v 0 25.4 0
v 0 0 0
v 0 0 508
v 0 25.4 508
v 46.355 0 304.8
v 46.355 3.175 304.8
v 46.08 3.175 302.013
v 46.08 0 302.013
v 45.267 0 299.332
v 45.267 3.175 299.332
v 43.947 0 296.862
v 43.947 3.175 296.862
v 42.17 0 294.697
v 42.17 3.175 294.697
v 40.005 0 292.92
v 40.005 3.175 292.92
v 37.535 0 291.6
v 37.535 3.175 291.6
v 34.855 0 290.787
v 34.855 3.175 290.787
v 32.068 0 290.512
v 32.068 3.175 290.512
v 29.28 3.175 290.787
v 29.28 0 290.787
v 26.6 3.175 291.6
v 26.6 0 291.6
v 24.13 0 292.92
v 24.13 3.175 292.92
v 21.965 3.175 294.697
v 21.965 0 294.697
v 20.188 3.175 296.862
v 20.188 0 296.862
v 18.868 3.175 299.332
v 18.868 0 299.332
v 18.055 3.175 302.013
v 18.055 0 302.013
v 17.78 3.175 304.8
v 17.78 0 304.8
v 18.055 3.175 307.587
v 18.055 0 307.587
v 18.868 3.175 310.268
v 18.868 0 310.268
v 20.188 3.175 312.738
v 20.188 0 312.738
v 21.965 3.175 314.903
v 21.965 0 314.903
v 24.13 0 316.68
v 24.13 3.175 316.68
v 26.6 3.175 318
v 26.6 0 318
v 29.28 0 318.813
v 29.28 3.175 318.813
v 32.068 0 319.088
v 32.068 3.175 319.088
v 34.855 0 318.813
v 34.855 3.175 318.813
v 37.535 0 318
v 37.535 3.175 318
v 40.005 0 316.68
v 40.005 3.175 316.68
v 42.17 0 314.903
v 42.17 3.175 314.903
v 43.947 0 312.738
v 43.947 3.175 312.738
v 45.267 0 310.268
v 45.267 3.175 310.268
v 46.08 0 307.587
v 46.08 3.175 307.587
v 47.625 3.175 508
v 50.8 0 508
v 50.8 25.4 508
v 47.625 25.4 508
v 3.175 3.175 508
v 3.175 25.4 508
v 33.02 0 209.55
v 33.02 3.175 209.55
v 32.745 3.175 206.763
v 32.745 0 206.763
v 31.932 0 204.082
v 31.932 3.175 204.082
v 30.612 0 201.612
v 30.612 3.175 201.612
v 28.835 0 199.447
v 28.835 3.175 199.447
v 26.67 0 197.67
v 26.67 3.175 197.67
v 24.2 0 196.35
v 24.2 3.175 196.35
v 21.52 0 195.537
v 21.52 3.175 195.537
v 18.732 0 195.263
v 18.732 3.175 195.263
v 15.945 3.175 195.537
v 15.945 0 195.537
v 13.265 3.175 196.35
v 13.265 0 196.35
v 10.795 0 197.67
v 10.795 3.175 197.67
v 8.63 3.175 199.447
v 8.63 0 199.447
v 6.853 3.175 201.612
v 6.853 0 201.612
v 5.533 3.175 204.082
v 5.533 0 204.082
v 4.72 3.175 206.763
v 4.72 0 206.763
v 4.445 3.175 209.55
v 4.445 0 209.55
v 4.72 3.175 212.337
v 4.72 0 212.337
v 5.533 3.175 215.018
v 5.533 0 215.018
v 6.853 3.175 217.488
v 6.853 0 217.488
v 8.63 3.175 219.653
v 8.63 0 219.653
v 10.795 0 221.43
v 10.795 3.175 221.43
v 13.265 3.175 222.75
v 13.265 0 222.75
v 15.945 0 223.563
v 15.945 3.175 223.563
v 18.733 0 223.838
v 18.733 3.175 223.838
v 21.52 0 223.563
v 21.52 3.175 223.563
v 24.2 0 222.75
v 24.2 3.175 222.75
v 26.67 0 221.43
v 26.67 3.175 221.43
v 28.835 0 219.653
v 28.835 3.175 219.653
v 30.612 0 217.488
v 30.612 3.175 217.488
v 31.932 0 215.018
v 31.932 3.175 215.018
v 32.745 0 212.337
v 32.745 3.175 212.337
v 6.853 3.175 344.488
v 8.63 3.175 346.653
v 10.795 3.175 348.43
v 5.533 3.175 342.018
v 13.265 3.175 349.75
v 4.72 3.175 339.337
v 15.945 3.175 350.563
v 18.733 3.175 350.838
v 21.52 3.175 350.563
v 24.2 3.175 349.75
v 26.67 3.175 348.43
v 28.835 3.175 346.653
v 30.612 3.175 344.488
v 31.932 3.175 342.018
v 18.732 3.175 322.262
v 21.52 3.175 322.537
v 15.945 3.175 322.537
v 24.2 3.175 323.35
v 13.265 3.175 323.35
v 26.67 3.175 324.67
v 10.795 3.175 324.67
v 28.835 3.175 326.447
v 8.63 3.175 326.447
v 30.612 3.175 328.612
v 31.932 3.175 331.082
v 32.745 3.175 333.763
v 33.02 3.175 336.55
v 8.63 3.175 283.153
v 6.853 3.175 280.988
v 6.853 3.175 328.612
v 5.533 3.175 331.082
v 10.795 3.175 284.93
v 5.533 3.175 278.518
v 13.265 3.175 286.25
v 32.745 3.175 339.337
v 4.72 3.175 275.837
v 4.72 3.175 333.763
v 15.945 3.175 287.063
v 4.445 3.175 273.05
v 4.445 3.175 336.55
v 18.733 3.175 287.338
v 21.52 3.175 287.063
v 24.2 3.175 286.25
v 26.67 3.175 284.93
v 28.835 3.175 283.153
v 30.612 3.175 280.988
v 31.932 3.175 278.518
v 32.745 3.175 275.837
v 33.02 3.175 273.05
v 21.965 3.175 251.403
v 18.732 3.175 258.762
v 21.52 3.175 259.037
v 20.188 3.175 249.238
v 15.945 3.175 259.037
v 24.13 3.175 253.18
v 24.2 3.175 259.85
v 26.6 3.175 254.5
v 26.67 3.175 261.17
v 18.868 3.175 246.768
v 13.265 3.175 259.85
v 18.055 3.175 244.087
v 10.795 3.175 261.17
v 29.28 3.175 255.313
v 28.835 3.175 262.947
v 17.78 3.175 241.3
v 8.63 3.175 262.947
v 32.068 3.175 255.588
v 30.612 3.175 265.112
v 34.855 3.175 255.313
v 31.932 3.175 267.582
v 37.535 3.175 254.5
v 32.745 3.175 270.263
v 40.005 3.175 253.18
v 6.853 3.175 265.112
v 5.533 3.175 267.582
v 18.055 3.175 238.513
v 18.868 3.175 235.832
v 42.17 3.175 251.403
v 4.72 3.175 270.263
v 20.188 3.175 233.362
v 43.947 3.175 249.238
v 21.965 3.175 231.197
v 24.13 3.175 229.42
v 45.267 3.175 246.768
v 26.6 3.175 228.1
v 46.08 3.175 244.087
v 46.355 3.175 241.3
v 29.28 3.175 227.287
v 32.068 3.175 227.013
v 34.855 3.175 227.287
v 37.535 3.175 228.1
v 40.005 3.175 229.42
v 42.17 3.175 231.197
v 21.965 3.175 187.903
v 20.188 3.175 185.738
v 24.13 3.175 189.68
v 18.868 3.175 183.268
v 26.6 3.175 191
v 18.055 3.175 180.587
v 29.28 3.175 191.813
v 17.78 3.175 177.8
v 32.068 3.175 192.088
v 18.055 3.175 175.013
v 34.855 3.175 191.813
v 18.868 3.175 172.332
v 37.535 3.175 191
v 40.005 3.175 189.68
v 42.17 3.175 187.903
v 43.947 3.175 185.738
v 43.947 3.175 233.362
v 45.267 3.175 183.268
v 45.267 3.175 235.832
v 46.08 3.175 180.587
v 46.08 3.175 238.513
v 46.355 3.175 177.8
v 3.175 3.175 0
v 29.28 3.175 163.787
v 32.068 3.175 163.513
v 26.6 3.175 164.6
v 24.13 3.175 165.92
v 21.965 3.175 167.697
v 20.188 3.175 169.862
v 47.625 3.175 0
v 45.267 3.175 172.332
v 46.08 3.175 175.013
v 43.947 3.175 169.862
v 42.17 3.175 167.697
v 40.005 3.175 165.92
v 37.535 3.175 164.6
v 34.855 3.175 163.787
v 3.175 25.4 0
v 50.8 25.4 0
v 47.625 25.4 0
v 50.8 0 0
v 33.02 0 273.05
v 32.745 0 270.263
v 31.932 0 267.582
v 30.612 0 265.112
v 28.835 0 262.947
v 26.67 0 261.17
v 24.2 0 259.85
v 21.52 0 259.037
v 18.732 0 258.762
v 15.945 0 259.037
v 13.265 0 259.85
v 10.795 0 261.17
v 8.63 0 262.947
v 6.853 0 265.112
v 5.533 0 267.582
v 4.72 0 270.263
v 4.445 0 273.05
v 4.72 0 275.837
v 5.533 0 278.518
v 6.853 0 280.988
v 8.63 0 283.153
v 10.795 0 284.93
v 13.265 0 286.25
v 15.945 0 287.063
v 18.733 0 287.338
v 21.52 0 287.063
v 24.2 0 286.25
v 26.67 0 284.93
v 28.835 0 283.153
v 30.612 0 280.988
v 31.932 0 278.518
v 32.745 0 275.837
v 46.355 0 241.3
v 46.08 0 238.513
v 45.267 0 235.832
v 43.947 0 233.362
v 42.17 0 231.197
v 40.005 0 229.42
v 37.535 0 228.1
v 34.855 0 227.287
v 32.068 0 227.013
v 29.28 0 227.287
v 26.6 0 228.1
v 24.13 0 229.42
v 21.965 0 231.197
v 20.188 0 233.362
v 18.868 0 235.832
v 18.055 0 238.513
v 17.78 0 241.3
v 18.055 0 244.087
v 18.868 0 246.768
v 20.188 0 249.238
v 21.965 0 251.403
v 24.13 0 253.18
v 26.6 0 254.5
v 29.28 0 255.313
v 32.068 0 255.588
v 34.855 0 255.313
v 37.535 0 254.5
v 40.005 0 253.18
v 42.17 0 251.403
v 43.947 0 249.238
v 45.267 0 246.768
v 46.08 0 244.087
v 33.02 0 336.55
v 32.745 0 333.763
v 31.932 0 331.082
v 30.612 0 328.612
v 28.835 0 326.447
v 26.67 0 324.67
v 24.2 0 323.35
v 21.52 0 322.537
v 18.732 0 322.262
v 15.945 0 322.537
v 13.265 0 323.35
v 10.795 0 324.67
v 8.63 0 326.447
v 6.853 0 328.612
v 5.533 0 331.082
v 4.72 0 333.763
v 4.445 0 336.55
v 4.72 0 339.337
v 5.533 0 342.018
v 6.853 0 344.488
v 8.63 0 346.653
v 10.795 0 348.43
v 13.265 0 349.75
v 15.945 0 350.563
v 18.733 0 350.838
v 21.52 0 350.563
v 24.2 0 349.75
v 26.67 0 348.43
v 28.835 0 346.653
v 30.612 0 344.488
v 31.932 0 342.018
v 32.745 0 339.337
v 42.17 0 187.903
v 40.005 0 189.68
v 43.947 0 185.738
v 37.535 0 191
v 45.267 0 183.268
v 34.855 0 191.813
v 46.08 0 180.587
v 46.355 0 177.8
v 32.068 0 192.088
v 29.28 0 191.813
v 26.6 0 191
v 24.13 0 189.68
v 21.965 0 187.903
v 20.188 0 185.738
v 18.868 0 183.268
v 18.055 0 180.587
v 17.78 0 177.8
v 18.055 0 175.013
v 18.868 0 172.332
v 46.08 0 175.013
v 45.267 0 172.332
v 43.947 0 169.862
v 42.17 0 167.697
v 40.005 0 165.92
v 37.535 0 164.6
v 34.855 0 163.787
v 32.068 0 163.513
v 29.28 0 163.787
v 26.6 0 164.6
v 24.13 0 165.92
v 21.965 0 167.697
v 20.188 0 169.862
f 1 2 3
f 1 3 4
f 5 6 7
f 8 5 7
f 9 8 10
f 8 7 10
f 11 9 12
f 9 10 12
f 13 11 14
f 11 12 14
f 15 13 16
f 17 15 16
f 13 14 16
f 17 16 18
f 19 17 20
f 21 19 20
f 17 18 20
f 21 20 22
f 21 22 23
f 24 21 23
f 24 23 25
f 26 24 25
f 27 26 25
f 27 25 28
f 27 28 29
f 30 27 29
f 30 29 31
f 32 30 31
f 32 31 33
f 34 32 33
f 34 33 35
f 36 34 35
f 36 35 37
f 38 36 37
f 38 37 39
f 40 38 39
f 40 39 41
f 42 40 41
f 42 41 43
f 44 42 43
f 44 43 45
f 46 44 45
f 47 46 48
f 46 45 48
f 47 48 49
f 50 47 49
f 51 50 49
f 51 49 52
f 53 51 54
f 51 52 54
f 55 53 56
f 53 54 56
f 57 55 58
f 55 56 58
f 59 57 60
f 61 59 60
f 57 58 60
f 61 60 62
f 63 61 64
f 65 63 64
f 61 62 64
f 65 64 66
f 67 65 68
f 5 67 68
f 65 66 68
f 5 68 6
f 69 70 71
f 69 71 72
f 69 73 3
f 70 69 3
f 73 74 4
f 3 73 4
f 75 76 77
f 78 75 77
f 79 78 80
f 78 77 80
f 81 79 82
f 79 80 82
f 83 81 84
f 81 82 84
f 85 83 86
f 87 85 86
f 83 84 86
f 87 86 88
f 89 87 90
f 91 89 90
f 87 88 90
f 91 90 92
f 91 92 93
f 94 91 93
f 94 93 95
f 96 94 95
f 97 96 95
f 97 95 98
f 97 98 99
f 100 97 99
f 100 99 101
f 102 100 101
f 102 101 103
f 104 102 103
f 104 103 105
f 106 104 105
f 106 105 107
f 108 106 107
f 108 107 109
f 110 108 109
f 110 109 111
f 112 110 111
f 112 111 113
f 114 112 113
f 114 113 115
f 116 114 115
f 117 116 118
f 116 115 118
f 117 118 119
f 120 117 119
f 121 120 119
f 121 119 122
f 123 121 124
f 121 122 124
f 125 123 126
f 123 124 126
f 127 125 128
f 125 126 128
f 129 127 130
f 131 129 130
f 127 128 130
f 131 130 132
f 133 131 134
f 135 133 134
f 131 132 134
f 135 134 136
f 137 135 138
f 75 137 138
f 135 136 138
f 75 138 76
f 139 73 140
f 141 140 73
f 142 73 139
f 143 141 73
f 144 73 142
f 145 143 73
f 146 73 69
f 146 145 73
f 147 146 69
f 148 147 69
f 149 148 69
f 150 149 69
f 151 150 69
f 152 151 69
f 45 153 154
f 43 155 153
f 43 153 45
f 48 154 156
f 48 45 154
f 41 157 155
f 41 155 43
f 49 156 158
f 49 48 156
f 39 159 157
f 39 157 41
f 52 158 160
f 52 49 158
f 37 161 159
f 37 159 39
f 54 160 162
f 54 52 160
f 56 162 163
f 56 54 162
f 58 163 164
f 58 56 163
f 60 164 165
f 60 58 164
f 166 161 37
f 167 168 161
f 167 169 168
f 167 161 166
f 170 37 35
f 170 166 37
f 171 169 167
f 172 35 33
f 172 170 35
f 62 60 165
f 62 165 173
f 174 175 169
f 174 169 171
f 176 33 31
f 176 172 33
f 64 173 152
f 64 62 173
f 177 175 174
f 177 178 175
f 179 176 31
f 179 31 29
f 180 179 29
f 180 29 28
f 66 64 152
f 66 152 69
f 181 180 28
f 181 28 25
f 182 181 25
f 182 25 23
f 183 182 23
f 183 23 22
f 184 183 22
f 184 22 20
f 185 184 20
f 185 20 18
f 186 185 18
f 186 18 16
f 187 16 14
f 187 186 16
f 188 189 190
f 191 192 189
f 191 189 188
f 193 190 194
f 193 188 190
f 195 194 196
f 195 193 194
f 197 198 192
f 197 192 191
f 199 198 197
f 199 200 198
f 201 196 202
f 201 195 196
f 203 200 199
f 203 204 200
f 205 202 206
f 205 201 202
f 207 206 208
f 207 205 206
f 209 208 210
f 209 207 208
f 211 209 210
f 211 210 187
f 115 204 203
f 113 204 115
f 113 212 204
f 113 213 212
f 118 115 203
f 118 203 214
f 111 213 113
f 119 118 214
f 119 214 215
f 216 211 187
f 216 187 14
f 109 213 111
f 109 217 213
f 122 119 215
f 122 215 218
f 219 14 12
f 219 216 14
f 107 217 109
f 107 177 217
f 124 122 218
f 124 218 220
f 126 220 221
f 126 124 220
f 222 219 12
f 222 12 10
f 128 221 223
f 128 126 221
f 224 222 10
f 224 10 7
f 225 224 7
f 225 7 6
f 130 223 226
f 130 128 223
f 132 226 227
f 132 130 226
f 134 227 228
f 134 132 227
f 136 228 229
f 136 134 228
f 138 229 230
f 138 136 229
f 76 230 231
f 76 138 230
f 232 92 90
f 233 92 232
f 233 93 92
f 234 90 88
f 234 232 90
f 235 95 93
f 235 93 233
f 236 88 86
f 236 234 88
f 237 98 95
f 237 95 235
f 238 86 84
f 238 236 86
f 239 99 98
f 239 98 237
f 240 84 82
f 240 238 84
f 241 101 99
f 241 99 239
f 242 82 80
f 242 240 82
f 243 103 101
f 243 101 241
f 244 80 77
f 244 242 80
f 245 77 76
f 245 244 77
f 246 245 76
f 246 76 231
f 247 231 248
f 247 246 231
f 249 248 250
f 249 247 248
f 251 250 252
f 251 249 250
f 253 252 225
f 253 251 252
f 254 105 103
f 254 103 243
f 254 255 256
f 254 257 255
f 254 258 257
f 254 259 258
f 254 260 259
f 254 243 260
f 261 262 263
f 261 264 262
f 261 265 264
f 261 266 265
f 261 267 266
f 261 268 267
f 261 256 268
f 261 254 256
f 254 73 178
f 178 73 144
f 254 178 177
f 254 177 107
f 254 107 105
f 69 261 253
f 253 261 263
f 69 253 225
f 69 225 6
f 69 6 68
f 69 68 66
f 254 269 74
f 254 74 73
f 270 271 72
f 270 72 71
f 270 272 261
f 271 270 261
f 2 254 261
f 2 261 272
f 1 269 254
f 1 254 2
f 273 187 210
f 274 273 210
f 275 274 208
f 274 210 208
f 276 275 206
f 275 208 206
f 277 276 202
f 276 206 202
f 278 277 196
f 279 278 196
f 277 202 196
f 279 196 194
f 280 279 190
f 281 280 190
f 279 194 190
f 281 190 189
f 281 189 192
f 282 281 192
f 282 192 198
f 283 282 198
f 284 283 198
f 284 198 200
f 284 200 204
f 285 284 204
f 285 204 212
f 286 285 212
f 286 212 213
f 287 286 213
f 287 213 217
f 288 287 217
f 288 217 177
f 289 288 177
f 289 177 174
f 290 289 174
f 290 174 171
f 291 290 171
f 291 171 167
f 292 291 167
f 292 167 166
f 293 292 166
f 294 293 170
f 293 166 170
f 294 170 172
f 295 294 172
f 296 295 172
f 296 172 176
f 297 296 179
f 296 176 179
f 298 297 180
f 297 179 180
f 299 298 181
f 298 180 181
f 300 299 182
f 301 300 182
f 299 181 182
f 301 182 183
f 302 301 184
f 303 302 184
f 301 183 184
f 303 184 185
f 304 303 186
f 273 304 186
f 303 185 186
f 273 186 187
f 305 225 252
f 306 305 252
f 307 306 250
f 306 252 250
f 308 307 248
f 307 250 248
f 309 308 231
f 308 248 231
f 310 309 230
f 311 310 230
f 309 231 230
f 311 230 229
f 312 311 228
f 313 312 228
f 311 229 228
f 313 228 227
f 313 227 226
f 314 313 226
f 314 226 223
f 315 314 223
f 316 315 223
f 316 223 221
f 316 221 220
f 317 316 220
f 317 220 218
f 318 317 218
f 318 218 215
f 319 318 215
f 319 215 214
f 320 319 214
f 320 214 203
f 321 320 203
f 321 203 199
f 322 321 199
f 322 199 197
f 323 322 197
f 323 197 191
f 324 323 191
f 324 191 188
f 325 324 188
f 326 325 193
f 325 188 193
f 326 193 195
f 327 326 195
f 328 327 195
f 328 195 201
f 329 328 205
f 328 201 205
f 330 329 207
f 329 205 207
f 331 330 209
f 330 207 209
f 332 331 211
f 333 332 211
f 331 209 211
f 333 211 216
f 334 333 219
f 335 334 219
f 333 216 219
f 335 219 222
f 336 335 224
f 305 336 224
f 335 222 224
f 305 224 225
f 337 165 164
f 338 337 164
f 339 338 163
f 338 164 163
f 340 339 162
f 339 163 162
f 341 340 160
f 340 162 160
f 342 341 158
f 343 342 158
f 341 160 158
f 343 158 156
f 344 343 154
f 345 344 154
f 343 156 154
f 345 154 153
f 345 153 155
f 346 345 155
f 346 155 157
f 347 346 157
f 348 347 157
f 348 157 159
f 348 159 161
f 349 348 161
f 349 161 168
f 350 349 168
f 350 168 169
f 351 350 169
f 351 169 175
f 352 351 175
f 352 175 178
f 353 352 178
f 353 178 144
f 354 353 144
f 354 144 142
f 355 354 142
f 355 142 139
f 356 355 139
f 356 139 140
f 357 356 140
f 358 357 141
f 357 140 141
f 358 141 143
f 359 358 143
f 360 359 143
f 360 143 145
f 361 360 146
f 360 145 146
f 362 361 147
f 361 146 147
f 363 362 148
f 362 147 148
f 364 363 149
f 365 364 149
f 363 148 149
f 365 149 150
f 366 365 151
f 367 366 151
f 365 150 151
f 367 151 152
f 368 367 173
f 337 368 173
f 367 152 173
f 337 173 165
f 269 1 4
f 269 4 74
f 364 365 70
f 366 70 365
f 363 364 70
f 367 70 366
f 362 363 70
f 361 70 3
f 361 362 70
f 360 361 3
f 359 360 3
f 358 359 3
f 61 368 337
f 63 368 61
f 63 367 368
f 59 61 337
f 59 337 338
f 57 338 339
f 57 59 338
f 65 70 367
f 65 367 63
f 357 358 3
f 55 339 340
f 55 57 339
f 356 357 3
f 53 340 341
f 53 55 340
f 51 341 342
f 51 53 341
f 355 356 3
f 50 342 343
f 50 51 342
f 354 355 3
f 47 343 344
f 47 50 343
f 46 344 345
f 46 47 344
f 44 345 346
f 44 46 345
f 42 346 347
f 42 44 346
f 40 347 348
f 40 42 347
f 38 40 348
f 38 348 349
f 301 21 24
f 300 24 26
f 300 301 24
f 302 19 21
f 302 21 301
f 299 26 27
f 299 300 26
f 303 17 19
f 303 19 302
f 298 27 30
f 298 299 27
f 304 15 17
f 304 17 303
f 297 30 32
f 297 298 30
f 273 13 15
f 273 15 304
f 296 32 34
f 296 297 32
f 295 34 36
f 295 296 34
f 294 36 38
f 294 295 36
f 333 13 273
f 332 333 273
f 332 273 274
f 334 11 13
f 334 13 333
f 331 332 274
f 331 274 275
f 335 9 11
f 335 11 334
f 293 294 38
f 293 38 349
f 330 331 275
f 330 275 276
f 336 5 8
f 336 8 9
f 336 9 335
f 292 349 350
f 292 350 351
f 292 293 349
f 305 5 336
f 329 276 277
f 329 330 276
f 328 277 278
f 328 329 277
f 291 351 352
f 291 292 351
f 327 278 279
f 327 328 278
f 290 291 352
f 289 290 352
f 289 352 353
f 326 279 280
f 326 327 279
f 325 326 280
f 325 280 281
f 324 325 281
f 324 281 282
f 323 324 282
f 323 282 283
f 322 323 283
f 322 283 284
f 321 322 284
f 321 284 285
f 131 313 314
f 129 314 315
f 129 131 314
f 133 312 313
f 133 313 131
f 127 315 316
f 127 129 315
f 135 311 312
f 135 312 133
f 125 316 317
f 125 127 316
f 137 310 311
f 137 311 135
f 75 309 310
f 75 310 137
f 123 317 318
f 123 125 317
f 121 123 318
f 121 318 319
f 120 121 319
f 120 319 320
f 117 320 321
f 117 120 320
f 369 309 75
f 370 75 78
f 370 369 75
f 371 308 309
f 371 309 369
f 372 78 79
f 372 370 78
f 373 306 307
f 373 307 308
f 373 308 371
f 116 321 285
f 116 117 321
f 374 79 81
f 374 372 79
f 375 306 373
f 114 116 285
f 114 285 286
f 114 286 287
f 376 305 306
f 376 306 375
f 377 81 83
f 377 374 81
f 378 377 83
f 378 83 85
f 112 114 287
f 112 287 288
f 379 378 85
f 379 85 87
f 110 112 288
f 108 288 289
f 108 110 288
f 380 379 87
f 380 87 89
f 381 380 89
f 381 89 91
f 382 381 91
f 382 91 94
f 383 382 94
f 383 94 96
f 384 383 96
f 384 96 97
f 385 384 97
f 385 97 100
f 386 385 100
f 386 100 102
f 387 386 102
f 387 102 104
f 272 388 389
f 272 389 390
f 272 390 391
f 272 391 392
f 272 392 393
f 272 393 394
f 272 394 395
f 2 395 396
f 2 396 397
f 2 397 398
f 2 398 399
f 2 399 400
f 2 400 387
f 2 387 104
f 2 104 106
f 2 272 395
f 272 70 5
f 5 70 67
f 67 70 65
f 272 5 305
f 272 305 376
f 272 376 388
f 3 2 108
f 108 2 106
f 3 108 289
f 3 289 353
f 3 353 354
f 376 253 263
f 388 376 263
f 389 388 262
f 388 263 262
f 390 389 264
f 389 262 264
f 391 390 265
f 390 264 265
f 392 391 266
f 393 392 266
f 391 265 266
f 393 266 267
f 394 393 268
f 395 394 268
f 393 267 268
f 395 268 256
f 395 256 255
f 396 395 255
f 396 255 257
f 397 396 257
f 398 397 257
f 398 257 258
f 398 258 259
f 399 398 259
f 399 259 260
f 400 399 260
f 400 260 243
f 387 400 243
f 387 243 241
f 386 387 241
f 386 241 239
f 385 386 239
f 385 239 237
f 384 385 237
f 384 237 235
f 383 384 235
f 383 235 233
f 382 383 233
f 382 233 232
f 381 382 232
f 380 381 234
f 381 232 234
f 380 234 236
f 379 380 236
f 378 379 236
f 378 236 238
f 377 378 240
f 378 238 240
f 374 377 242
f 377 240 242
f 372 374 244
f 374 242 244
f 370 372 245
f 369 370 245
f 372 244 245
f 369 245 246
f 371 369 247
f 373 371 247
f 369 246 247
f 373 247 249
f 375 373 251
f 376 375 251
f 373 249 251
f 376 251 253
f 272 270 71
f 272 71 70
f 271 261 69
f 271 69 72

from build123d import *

# Parameters (mm, degrees)
BOSS_EXTRUDE1_DEPTH = 508
CUT_EXTRUDE1_REACH  = 5.175
SKETCH2_R           = 14.2875


with BuildPart() as part:
    # Sketch1 → Boss-Extrude1 (new body)
    with BuildSketch(Plane.XY):
        Polygon((47.625, 3.175), (47.625, 25.4), (50.8, 25.4), (50.8, 0), (0, 0), (0, 25.4), (3.175, 25.4), (3.175, 3.175), align=None)
    extrude(amount=BOSS_EXTRUDE1_DEPTH)

    # Sketch2 → Cut-Extrude1 (cut, up to next)
    with BuildSketch(Plane(origin=(0, 3.175, 0), x_dir=(1, 0, 0), z_dir=(0, 1, 0)), mode=Mode.PRIVATE) as cut_extrude1_sk1:
        with Locations((18.7325, -336.55)):
            Circle(SKETCH2_R)
    cut_extrude1_tool1 = extrude(cut_extrude1_sk1.sketch, amount=-CUT_EXTRUDE1_REACH, mode=Mode.PRIVATE) & part.part
    add(cut_extrude1_tool1.solids().sort_by_distance((18.7325, 3.175, 336.55))[0], mode=Mode.SUBTRACT)
    # Sketch2 → Cut-Extrude1 (cut, up to next)
    with BuildSketch(Plane(origin=(0, 3.175, 0), x_dir=(1, 0, 0), z_dir=(0, 1, 0)), mode=Mode.PRIVATE) as cut_extrude1_sk2:
        with Locations((32.0675, -304.8)):
            Circle(SKETCH2_R)
    cut_extrude1_tool2 = extrude(cut_extrude1_sk2.sketch, amount=-CUT_EXTRUDE1_REACH, mode=Mode.PRIVATE) & part.part
    add(cut_extrude1_tool2.solids().sort_by_distance((32.0675, 3.175, 304.8))[0], mode=Mode.SUBTRACT)
    # Sketch2 → Cut-Extrude1 (cut, up to next)
    with BuildSketch(Plane(origin=(0, 3.175, 0), x_dir=(1, 0, 0), z_dir=(0, 1, 0)), mode=Mode.PRIVATE) as cut_extrude1_sk3:
        with Locations((18.7325, -273.05)):
            Circle(SKETCH2_R)
    cut_extrude1_tool3 = extrude(cut_extrude1_sk3.sketch, amount=-CUT_EXTRUDE1_REACH, mode=Mode.PRIVATE) & part.part
    add(cut_extrude1_tool3.solids().sort_by_distance((18.7325, 3.175, 273.05))[0], mode=Mode.SUBTRACT)
    # Sketch2 → Cut-Extrude1 (cut, up to next)
    with BuildSketch(Plane(origin=(0, 3.175, 0), x_dir=(1, 0, 0), z_dir=(0, 1, 0)), mode=Mode.PRIVATE) as cut_extrude1_sk4:
        with Locations((32.0675, -241.3)):
            Circle(SKETCH2_R)
    cut_extrude1_tool4 = extrude(cut_extrude1_sk4.sketch, amount=-CUT_EXTRUDE1_REACH, mode=Mode.PRIVATE) & part.part
    add(cut_extrude1_tool4.solids().sort_by_distance((32.0675, 3.175, 241.3))[0], mode=Mode.SUBTRACT)
    # Sketch2 → Cut-Extrude1 (cut, up to next)
    with BuildSketch(Plane(origin=(0, 3.175, 0), x_dir=(1, 0, 0), z_dir=(0, 1, 0)), mode=Mode.PRIVATE) as cut_extrude1_sk5:
        with Locations((18.7325, -209.55)):
            Circle(SKETCH2_R)
    cut_extrude1_tool5 = extrude(cut_extrude1_sk5.sketch, amount=-CUT_EXTRUDE1_REACH, mode=Mode.PRIVATE) & part.part
    add(cut_extrude1_tool5.solids().sort_by_distance((18.7325, 3.175, 209.55))[0], mode=Mode.SUBTRACT)
    # Sketch2 → Cut-Extrude1 (cut, up to next)
    with BuildSketch(Plane(origin=(0, 3.175, 0), x_dir=(1, 0, 0), z_dir=(0, 1, 0)), mode=Mode.PRIVATE) as cut_extrude1_sk6:
        with Locations((32.0675, -177.8)):
            Circle(SKETCH2_R)
    cut_extrude1_tool6 = extrude(cut_extrude1_sk6.sketch, amount=-CUT_EXTRUDE1_REACH, mode=Mode.PRIVATE) & part.part
    add(cut_extrude1_tool6.solids().sort_by_distance((32.0675, 3.175, 177.8))[0], mode=Mode.SUBTRACT)


solid = part.part
